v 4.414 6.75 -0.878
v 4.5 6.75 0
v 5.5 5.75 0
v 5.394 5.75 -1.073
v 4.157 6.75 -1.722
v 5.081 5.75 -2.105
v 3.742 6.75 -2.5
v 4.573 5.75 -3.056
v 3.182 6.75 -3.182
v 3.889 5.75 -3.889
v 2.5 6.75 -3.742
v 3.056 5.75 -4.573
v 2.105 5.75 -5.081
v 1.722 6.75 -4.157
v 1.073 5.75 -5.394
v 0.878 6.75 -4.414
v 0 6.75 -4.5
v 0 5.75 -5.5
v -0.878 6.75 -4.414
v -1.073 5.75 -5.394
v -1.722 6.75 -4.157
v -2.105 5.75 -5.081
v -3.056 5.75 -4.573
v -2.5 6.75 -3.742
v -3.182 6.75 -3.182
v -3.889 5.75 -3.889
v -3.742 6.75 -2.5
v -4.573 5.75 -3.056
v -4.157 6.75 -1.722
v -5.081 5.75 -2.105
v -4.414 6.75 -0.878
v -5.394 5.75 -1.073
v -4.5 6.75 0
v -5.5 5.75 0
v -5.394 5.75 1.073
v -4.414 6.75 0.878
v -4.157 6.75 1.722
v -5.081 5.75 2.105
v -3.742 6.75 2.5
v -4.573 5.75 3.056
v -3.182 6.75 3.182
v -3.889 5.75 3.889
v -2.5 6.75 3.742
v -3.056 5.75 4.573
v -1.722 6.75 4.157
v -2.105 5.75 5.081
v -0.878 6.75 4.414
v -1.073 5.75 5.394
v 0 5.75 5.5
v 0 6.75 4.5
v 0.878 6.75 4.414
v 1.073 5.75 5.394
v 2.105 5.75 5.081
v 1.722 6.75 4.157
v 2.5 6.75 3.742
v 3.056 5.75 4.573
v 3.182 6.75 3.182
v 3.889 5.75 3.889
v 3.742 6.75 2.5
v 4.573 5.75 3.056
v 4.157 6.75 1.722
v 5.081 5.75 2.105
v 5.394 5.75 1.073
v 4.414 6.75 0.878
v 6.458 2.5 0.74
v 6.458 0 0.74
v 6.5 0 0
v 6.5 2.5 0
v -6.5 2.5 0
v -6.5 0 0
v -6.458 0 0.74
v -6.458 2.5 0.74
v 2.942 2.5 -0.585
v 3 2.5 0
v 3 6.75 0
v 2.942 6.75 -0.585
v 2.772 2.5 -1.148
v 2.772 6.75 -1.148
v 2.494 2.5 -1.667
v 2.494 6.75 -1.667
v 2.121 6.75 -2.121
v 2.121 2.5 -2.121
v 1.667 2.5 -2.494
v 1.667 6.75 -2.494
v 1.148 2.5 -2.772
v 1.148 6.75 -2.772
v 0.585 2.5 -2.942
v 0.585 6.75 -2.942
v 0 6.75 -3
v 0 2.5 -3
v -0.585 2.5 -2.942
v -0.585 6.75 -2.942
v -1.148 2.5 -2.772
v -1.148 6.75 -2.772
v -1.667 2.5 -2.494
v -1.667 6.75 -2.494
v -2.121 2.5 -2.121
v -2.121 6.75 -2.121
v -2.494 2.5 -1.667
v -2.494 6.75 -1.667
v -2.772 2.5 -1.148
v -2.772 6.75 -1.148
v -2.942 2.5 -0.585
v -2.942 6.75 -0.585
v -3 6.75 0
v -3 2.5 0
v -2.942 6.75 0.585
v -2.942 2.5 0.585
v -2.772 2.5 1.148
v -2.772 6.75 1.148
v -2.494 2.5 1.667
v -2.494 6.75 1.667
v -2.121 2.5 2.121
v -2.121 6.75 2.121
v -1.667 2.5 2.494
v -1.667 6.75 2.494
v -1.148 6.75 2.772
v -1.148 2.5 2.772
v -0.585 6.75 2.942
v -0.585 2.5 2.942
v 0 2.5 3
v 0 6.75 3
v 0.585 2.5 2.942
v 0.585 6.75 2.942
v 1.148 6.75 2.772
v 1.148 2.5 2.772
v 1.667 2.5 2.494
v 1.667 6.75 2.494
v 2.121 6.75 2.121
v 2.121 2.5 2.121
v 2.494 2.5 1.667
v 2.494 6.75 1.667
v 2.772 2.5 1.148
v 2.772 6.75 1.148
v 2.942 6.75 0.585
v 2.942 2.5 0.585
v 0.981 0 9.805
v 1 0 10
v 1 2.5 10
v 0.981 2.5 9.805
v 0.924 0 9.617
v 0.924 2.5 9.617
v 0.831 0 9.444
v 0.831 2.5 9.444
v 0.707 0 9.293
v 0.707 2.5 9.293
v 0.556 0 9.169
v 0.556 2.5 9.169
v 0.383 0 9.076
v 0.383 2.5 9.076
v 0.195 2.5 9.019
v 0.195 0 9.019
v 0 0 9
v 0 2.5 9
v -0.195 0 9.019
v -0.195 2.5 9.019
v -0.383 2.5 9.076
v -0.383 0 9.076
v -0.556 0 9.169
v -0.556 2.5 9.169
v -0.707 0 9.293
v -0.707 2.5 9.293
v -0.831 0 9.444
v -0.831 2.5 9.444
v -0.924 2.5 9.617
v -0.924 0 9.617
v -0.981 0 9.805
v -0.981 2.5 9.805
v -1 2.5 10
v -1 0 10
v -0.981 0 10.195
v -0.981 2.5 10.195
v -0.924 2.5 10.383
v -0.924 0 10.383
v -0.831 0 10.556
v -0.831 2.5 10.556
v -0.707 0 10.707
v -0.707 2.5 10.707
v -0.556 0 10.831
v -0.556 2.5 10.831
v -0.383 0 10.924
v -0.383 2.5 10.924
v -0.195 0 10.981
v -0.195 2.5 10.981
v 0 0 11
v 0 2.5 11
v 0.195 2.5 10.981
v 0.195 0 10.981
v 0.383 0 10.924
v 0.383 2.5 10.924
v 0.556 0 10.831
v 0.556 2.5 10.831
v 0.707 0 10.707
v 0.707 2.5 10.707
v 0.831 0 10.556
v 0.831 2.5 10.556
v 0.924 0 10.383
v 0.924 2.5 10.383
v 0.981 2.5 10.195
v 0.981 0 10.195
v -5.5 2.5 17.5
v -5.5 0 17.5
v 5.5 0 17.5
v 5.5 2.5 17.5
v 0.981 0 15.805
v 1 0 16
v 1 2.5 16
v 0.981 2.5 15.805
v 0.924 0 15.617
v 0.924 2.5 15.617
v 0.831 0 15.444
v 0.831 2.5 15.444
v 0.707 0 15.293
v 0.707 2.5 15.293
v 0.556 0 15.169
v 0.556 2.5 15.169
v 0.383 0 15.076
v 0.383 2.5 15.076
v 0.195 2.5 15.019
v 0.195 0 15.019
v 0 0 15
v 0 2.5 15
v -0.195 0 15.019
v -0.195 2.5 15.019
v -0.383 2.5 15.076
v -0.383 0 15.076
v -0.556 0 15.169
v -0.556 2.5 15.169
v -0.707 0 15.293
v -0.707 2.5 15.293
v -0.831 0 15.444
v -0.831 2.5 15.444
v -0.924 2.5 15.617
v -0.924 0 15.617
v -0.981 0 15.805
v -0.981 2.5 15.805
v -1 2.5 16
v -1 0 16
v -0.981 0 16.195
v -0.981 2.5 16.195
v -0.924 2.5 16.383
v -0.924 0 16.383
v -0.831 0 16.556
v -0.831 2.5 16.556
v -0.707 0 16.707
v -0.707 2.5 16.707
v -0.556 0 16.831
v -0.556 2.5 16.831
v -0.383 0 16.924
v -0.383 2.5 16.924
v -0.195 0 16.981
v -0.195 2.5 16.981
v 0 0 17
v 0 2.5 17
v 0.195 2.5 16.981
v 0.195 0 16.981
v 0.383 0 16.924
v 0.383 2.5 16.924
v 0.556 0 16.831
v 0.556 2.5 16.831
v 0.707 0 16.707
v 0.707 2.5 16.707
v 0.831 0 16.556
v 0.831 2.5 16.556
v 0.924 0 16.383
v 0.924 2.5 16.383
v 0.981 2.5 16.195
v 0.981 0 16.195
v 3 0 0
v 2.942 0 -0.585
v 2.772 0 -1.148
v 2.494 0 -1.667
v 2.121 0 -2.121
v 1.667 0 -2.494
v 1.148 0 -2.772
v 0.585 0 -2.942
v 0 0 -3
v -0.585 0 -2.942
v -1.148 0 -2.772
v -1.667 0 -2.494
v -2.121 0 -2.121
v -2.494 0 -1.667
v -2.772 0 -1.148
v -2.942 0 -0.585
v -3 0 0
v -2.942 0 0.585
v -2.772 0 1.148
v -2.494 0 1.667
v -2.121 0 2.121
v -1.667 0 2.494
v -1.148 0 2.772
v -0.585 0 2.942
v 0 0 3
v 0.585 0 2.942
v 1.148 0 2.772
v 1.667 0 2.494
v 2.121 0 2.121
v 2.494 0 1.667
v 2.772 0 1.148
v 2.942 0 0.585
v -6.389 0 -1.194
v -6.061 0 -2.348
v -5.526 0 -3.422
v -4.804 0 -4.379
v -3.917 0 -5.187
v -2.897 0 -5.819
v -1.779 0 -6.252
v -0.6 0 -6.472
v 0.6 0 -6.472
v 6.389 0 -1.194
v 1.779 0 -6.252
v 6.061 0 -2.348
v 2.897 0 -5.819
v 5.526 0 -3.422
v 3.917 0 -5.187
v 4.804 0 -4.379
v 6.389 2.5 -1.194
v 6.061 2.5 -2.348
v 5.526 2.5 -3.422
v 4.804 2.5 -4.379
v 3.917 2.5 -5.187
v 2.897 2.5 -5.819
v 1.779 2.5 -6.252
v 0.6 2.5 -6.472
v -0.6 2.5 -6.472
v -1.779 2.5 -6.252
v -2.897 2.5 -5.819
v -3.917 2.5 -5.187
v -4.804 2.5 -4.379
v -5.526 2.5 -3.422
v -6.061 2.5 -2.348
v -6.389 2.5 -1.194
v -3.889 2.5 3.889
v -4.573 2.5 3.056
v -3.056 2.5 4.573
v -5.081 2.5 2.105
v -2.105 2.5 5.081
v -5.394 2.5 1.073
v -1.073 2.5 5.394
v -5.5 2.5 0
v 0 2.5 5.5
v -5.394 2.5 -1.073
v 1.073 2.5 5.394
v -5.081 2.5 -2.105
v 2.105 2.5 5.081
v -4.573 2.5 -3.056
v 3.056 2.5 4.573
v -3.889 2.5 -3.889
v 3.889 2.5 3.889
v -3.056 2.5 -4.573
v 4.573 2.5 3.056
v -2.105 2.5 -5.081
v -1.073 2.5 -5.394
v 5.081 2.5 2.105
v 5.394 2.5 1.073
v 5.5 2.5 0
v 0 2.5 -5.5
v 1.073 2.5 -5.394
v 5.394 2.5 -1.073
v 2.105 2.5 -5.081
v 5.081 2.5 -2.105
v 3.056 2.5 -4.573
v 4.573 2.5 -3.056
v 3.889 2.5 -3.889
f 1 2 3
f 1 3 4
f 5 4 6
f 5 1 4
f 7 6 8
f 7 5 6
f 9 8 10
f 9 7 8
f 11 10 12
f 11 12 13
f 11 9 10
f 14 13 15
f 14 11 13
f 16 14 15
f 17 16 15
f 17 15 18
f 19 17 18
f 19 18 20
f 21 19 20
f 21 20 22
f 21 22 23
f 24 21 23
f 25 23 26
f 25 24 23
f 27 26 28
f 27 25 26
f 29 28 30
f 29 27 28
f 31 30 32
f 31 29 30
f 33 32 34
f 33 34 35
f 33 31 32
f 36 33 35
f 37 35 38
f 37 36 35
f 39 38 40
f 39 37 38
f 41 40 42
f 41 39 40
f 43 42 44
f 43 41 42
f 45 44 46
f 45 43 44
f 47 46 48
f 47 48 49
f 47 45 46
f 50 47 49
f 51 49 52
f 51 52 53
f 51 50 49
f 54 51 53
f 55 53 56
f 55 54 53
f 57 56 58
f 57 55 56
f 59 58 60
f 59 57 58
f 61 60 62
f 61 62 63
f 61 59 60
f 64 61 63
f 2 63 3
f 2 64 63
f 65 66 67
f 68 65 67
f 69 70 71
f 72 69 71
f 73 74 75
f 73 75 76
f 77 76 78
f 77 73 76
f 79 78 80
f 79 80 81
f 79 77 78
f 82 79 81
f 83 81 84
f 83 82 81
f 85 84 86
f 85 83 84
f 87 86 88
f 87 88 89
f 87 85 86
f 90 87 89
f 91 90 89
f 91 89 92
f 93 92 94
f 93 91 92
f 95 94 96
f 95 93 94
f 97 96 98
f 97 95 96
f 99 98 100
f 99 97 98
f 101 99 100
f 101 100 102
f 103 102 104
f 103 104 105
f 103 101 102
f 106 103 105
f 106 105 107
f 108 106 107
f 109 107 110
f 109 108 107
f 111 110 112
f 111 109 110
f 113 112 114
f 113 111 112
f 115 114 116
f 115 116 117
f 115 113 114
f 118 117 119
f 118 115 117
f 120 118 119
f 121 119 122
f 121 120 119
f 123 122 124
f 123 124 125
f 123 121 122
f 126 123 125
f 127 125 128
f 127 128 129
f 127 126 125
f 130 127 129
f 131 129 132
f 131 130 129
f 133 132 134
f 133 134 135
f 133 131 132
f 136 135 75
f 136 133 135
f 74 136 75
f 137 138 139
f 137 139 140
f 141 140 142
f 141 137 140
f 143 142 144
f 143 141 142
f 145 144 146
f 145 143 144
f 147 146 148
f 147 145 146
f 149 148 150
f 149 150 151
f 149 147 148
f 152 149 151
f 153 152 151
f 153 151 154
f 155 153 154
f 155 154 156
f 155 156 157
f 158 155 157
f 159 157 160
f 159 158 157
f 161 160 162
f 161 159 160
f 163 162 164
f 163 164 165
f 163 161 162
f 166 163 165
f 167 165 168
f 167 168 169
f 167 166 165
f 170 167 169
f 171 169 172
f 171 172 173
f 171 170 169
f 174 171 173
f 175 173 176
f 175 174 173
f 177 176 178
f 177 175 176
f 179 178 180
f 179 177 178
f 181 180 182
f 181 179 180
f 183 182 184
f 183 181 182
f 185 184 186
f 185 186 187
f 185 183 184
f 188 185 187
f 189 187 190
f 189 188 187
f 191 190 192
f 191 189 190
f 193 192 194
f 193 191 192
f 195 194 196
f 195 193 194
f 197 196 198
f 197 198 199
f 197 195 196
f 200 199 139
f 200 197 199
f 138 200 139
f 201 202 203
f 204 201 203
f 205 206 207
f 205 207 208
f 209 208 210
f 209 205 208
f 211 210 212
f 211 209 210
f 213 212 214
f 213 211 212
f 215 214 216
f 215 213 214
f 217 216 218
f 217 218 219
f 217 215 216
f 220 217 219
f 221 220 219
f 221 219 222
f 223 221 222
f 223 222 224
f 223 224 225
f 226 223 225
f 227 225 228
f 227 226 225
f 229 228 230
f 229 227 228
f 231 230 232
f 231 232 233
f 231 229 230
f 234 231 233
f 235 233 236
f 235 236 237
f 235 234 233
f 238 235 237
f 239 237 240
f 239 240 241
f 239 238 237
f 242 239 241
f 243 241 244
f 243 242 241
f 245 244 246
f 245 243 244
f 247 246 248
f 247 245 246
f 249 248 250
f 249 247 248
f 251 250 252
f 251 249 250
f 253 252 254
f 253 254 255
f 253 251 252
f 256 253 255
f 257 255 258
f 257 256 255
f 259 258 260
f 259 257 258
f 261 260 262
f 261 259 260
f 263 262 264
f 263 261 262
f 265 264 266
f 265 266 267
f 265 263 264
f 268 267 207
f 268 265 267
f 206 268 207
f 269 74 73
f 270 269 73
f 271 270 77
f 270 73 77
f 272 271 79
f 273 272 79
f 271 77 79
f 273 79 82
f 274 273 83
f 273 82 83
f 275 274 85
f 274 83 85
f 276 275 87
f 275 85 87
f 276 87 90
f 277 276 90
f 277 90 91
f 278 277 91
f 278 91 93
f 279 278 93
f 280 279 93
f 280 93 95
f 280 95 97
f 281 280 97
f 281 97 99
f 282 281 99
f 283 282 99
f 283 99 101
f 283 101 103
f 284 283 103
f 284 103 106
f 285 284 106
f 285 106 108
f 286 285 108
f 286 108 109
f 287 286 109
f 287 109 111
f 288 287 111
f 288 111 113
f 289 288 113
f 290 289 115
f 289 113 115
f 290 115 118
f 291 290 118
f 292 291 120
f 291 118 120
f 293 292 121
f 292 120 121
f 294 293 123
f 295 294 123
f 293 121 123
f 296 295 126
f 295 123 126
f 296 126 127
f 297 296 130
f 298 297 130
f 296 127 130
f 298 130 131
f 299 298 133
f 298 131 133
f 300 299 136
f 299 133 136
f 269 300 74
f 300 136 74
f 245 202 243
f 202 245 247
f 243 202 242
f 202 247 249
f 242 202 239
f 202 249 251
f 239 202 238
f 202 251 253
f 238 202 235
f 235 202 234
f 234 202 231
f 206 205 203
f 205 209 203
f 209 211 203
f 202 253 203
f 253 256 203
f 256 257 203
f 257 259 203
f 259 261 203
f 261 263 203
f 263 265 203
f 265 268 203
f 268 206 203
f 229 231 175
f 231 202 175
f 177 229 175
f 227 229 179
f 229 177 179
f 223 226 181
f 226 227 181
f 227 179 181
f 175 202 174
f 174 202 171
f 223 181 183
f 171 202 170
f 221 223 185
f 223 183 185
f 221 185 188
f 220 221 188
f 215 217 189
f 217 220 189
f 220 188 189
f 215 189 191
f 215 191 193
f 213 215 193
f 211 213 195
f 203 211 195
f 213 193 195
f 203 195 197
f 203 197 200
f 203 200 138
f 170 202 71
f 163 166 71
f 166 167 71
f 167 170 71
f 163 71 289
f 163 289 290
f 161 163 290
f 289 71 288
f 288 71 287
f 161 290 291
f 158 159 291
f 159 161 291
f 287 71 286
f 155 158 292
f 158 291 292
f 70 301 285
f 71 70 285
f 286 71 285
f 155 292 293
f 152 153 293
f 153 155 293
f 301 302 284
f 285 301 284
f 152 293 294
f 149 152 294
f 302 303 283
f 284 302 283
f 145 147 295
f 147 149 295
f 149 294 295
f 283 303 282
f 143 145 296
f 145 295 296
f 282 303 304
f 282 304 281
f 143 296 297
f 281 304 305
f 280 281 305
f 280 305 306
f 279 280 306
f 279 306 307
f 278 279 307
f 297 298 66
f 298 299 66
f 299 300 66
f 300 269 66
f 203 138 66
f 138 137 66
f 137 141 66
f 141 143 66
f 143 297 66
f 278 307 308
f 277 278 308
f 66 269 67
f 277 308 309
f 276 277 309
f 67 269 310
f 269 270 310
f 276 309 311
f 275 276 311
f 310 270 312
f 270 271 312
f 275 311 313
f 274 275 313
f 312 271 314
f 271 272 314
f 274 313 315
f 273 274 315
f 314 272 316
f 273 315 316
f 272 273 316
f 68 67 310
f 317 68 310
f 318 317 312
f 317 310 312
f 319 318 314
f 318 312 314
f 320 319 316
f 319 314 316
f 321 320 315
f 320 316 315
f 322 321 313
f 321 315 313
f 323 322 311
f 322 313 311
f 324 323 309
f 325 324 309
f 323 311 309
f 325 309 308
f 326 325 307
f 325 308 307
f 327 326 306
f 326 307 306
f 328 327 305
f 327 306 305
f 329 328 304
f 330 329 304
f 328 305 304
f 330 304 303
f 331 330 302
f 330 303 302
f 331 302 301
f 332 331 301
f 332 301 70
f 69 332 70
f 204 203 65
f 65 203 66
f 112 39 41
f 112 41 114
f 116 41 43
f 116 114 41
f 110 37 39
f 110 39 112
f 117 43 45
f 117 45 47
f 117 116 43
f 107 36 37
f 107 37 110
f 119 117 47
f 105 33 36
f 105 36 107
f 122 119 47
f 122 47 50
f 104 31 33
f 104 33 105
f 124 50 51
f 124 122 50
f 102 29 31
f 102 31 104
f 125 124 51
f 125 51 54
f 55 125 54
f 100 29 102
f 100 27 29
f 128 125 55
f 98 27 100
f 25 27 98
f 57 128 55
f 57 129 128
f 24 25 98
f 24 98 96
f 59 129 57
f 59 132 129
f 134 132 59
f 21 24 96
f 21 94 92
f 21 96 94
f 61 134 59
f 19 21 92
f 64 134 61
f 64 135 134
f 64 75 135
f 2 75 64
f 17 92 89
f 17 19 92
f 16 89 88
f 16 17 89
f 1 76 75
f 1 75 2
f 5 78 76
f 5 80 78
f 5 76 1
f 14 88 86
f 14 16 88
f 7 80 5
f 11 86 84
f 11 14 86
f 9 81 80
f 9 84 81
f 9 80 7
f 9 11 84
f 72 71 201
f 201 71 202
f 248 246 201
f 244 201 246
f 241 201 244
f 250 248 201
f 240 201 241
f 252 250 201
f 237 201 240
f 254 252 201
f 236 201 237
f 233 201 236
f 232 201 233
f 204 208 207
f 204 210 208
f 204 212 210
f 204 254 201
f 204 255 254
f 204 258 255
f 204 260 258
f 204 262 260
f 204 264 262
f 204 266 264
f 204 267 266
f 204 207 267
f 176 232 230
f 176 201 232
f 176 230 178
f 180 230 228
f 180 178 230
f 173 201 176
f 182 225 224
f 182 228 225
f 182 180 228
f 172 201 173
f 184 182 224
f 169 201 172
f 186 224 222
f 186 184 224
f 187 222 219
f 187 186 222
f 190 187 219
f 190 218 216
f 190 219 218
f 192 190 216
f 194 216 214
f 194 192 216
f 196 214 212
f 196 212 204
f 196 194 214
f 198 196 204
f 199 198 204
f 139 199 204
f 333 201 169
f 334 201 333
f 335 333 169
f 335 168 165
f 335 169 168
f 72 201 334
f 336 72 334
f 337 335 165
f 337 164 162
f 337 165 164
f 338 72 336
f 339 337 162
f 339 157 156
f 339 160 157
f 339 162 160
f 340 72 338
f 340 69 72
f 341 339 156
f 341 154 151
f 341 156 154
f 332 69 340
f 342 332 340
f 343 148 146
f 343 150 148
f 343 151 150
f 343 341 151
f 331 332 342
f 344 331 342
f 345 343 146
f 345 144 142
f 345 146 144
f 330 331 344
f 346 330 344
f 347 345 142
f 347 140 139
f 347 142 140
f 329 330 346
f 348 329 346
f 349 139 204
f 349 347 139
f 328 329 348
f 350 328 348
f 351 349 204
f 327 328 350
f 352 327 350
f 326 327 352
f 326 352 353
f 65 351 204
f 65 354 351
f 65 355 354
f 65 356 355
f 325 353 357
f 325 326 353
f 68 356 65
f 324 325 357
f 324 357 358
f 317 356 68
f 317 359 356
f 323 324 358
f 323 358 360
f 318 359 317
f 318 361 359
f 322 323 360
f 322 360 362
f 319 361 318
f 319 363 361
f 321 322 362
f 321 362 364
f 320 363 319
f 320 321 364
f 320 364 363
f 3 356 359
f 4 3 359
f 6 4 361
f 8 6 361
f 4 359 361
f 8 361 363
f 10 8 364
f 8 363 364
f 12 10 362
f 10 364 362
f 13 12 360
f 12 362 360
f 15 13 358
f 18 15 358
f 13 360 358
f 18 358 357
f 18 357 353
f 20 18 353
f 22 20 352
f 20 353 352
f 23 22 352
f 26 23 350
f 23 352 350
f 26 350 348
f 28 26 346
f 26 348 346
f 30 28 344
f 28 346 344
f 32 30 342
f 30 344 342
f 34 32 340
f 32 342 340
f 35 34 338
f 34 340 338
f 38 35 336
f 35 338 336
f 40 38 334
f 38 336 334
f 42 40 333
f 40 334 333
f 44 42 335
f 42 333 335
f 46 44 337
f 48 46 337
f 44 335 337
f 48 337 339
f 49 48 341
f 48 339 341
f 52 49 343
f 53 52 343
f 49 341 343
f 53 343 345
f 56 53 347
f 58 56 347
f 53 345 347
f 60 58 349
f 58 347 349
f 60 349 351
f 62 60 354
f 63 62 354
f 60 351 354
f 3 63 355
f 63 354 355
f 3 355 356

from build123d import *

# Parameters (mm, degrees)
SKETCH1_R           = 1
BOSS_EXTRUDE1_DEPTH = 2.5
SKETCH2_R           = 5.5
SKETCH2_R_2         = 3
BOSS_EXTRUDE3_DEPTH = 4.25
CUT_EXTRUDE1_REACH  = 4.5
SKETCH4_R           = 3
CHAMFER1_SIZE       = 1


with BuildPart() as part:
    # Sketch1 → Boss-Extrude1 (new body)
    with BuildSketch(Plane(origin=(0, 0, 0), x_dir=(1, 0, 0), z_dir=(0, 1, 0))):
        with BuildLine():
            ThreePointArc((6.5, 0), (0, 6.5), (-6.5, 0))
            Line((-6.5, 0), (-6.457689178, -0.740439382))
            Line((-6.457689178, -0.740439382), (-5.5, -17.5))
            Line((-5.5, -17.5), (5.5, -17.5))
            Line((5.5, -17.5), (6.457689178, -0.740439382))
            Line((6.457689178, -0.740439382), (6.5, 0))
        make_face()
        with Locations((0, -16)):
            Circle(SKETCH1_R, mode=Mode.SUBTRACT)
        with Locations((0, -10)):
            Circle(SKETCH1_R, mode=Mode.SUBTRACT)
    extrude(amount=BOSS_EXTRUDE1_DEPTH)

    # Sketch2 → Boss-Extrude3 (add)
    with BuildSketch(Plane(origin=(0, 2.5, 0), x_dir=(1, 0, 0), z_dir=(0, 1, 0))):
        Circle(SKETCH2_R)
        Circle(SKETCH2_R_2, mode=Mode.SUBTRACT)
    extrude(amount=BOSS_EXTRUDE3_DEPTH)

    # Sketch4 → Cut-Extrude1 (cut, up to next)
    with BuildSketch(Plane(origin=(0, 2.5, 0), x_dir=(1, 0, 0), z_dir=(0, 1, 0)), mode=Mode.PRIVATE) as cut_extrude1_sk1:
        Circle(SKETCH4_R)
    cut_extrude1_tool1 = extrude(cut_extrude1_sk1.sketch, amount=-CUT_EXTRUDE1_REACH, mode=Mode.PRIVATE) & part.part
    add(cut_extrude1_tool1.solids().sort_by_distance((0, 2.5, 0))[0], mode=Mode.SUBTRACT)

    # Chamfer1
    chamfer1_edges = [part.edges().sort_by_distance(p)[0] for p in [
        (-5.5, 6.75, 0),
    ]]
    chamfer(chamfer1_edges, length=CHAMFER1_SIZE)


solid = part.part
